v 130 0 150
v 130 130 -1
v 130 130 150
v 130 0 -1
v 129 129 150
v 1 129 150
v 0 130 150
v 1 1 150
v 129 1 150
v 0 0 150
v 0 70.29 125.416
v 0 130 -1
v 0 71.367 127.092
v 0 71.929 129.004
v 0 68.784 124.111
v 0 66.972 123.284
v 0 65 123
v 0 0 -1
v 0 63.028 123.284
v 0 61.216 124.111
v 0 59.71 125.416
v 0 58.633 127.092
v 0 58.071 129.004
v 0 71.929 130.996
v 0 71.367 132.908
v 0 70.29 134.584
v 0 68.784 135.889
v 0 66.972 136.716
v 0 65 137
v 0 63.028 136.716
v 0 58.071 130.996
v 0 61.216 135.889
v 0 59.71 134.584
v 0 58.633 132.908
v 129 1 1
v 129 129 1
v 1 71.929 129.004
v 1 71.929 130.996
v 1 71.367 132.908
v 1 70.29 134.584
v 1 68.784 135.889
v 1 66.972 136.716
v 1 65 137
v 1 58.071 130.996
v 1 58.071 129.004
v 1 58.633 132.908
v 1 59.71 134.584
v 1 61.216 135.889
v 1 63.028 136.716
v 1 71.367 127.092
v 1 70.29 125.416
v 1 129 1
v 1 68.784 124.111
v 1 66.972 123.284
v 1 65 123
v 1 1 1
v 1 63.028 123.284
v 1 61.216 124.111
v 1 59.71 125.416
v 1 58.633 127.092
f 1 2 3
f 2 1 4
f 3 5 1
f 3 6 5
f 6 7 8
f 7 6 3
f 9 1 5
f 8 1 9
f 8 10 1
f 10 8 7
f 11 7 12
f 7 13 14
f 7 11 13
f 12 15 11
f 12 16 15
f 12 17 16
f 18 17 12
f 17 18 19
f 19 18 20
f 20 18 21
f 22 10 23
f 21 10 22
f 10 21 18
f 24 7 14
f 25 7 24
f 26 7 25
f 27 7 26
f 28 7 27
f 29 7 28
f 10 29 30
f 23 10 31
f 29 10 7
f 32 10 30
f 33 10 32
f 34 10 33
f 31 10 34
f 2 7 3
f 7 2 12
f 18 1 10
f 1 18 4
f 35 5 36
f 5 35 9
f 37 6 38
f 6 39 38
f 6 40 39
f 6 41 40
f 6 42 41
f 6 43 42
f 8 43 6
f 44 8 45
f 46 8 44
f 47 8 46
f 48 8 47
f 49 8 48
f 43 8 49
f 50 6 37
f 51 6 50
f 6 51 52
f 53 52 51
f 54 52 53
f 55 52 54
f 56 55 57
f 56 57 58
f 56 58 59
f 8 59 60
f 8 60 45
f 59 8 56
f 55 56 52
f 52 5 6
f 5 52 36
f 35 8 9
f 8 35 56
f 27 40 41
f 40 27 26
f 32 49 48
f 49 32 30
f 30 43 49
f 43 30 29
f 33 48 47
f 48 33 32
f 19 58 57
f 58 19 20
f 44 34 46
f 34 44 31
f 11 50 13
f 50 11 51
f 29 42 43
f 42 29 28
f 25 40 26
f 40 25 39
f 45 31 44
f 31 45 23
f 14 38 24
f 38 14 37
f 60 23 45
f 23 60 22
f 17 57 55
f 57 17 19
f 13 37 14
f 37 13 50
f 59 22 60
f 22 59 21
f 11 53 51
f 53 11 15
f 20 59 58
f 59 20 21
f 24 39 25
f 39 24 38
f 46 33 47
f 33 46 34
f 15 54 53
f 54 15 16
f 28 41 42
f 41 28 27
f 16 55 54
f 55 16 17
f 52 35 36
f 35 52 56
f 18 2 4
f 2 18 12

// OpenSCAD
meshX=26;
meshY=18;
meshZ=40;
Seedrows=4;
Seedcolumns=4;

spokeCount=24;
spokerows=8;
spokeDia=15;
spokeY=2;
wallWidth=2;

//Single Plant Box
reservoir(130,130,2,150);

module lip(x,y,wall, height)
{
     translate([x/2,y/2,height/2]) difference()
    {
    cube([x,y,height],true);
    cube([x-wall,y-wall,height+1], true);
    }
}

module overlap(x,y,thickness, base)
{
    height=3;
    wall=3;
    
    echo(x=x,y=y,thickness=thickness, base=base);
    difference()
    {
    color("red")  cube([x,y,thickness],true);
     color("pink") cube([x-base,y-base,thickness+2],true);   
    }
    
    translate([0,0,thickness]) difference()
    {
    color("blue") cube([x,y,height],true);
    //color("lightblue") cube([x-wall,y-wall,height+1], true);
    }
}

module reservoir(x,y,wall, height)
{
    echo(x=x,y=y,wall=wall, height=height);
    //resize([0,0,0]) 
    translate([x/2,y/2,0]) 
    cube([x,y,wall],true);
    difference()
    {
    lip(x,y,wall,height);
    color("blue") translate([-5,y/2,height-(meshZ/2)])
    rotate(a=180, v=[1,0,1]) cylinder(20,7,7, false);
    }
    
}

//difference()
//{
//overlap(198,198,3,3);
//translate(0,0,-2) cube([170,170,10],true);
//}

//reservoir(130,130,2,121);
